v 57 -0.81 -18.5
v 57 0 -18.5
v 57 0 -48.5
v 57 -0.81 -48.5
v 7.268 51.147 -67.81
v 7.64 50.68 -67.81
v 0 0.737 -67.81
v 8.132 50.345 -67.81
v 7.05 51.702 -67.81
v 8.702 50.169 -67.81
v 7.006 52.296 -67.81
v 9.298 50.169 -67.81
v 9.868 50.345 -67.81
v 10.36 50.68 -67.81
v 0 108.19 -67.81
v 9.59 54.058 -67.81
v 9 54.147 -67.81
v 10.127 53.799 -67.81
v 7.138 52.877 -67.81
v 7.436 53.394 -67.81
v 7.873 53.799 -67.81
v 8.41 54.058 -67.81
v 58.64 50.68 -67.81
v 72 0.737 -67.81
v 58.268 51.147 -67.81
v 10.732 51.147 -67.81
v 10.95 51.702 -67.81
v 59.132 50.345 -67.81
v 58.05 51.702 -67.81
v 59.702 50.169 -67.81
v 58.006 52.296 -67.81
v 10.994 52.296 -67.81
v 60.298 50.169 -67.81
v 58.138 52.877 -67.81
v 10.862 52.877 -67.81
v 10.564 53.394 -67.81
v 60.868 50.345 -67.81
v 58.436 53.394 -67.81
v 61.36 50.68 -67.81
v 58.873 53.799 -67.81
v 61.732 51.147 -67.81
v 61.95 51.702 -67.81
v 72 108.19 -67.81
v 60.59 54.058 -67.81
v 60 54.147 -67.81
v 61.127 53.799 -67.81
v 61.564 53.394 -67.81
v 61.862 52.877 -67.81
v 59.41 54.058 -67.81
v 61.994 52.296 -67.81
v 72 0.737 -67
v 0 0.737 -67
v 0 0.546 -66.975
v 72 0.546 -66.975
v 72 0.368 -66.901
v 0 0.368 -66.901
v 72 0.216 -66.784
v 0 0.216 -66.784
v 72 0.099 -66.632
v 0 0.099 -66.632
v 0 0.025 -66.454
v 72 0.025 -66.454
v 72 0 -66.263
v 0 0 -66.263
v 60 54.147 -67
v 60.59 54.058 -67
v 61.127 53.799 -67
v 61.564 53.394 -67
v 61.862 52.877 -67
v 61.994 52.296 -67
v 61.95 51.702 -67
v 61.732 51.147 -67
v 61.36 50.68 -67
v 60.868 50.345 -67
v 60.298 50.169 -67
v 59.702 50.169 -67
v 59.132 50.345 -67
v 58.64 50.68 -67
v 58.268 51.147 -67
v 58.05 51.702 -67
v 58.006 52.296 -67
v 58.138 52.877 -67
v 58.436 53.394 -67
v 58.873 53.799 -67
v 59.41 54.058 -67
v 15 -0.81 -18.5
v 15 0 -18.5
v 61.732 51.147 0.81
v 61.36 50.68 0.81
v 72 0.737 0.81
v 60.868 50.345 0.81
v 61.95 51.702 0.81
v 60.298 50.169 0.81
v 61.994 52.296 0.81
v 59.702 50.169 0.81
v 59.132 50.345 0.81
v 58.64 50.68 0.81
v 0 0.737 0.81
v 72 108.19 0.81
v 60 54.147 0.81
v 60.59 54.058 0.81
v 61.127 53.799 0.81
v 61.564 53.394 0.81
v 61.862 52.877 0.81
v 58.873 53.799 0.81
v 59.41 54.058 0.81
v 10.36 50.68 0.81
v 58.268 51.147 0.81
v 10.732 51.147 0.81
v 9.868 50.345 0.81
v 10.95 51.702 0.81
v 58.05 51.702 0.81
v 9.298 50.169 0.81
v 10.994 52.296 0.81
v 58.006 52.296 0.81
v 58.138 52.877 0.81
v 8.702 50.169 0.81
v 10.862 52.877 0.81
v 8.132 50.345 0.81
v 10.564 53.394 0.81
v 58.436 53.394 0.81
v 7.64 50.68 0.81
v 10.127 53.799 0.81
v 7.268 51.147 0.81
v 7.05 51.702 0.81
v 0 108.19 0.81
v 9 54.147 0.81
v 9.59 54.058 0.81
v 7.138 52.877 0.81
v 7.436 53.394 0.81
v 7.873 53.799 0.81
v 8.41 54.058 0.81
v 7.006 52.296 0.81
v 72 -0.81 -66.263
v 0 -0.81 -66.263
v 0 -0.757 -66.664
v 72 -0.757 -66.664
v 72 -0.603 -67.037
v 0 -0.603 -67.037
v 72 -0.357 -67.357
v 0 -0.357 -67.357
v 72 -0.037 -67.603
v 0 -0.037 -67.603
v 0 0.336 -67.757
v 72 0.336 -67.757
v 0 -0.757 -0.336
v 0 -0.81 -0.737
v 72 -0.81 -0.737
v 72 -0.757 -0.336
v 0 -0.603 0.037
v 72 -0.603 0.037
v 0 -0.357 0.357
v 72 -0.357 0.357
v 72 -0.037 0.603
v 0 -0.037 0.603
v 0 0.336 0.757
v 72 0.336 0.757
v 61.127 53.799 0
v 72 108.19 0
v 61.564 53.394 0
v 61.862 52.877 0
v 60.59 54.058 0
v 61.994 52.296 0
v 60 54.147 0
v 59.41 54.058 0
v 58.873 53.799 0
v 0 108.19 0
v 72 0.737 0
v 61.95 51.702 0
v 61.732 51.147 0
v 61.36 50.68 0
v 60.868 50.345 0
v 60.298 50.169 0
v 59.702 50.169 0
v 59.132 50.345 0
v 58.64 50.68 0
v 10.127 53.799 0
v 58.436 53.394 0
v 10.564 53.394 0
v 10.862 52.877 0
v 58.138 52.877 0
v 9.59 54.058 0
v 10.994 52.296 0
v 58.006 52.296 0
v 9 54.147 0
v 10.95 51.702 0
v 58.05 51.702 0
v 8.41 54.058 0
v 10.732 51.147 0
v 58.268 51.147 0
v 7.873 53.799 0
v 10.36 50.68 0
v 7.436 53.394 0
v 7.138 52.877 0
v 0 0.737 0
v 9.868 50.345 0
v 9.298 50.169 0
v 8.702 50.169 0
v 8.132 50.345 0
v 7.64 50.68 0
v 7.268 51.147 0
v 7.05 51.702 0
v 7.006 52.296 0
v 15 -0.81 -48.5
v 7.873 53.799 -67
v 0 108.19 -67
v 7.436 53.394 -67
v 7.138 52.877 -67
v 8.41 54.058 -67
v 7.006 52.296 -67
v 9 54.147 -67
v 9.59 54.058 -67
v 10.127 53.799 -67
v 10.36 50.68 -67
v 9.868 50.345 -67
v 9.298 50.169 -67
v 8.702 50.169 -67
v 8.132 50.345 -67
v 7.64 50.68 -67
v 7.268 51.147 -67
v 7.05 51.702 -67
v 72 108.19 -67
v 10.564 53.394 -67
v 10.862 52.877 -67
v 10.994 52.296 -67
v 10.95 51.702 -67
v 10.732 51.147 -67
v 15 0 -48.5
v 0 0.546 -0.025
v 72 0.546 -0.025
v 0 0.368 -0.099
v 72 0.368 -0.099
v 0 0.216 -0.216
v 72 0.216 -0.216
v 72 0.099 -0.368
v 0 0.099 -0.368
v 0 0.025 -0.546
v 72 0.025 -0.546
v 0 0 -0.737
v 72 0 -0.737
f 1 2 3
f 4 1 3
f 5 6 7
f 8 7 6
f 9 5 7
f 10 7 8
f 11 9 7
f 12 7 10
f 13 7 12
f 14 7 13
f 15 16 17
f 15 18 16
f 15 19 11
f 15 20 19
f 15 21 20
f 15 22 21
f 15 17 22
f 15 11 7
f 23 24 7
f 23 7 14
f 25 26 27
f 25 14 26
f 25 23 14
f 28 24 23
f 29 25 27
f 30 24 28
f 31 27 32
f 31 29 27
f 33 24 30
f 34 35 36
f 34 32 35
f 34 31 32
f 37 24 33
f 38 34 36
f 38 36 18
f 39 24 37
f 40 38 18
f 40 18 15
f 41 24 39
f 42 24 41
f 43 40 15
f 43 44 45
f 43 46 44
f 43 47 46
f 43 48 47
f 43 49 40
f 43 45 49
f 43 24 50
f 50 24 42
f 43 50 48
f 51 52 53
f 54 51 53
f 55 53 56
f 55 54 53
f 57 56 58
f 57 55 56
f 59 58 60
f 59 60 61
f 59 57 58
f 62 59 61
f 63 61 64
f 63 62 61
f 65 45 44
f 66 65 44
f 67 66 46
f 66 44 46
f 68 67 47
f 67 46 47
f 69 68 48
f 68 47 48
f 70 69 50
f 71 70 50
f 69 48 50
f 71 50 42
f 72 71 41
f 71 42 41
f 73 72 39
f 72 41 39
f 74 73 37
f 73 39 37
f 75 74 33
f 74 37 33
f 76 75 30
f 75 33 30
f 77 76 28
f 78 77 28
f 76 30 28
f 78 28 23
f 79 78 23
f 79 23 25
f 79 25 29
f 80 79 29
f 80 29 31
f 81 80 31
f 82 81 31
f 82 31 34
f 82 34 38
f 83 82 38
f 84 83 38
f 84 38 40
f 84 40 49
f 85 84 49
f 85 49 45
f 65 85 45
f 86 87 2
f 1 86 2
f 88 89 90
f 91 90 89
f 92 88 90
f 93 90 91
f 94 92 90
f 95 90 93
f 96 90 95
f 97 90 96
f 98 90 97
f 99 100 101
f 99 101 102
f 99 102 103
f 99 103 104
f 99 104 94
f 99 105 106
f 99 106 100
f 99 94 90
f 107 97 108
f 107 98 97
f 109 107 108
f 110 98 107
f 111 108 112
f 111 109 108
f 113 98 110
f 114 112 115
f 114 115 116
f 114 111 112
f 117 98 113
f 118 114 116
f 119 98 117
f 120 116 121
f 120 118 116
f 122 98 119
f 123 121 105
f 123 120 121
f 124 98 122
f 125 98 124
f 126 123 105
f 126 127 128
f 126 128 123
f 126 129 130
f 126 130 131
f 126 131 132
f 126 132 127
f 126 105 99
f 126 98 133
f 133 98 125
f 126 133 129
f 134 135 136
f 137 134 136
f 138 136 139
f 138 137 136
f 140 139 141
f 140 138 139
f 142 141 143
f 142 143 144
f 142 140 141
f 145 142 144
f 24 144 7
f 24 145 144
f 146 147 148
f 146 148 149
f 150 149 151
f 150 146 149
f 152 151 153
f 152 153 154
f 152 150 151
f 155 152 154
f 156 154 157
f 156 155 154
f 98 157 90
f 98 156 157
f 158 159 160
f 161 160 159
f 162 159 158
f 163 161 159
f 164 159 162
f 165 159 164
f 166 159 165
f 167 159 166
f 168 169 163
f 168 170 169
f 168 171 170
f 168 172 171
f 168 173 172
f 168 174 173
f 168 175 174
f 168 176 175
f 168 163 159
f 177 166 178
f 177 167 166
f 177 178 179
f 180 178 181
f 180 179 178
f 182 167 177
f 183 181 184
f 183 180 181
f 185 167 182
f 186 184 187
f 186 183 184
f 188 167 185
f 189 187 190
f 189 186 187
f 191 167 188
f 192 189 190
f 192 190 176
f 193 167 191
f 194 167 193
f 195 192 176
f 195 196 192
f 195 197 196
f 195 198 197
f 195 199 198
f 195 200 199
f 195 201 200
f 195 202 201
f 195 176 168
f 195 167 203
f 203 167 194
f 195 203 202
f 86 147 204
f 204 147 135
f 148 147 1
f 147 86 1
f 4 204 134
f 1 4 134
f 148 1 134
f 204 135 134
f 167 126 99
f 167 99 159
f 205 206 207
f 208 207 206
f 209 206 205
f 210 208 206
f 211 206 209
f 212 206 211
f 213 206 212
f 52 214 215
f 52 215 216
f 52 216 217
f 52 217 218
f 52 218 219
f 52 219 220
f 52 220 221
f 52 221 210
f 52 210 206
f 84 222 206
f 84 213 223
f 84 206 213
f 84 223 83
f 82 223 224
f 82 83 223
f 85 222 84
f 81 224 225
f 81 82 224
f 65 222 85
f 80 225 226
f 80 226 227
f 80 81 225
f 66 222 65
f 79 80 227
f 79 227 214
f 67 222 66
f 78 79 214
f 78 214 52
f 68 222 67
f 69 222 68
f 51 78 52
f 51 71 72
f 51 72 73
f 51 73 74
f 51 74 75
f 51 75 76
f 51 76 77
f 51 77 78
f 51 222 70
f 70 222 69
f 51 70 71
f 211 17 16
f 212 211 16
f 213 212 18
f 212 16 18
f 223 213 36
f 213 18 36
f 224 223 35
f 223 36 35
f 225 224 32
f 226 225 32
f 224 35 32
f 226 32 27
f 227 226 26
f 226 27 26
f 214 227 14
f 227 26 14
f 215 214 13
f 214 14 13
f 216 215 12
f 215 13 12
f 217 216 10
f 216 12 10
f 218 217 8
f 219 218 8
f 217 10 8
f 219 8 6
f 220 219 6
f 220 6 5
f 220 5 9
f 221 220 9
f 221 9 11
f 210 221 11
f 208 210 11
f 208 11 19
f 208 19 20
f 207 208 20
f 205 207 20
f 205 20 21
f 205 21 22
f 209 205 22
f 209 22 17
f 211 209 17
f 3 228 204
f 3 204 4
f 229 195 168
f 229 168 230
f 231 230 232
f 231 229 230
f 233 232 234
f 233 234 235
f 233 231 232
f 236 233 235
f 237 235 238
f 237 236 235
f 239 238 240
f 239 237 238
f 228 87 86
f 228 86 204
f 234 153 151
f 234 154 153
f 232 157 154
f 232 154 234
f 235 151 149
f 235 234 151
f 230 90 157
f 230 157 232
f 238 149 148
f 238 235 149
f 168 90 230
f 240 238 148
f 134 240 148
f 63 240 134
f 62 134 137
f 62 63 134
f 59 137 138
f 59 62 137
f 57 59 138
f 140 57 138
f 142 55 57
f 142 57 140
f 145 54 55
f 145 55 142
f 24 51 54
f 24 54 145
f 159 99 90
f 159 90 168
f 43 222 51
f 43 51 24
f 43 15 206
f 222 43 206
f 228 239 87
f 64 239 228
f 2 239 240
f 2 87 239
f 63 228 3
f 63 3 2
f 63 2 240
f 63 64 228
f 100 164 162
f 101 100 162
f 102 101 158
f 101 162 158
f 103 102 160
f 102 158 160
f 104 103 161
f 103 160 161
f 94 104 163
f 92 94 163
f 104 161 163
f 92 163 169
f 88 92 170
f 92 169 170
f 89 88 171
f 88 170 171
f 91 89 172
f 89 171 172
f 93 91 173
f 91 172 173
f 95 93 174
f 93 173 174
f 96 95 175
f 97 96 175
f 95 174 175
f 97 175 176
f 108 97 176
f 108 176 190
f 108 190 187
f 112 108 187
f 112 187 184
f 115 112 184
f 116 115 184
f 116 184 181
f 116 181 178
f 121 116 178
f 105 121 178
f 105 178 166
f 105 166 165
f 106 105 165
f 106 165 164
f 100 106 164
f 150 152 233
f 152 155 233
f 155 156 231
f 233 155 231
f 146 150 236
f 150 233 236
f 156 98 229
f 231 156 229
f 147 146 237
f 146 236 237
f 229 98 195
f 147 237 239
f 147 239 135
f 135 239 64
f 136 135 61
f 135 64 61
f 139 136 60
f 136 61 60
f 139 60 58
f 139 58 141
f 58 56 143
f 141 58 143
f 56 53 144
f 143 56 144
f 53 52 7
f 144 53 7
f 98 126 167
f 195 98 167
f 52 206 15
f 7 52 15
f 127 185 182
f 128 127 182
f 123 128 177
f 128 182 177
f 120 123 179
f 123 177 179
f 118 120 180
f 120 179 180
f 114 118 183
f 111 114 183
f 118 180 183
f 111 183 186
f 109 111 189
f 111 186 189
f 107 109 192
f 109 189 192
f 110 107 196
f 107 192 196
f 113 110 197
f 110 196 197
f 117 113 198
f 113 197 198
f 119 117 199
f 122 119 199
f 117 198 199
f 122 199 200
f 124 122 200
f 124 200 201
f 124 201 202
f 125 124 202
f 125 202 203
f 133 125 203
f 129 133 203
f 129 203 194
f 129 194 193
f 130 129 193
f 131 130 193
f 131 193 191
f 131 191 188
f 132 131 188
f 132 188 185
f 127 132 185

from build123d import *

# Parameters (mm, degrees)
SKETCH1_W                      = 72
SKETCH1_H                      = 67
BASE_FLANGE1_DEPTH             = 0.81
EDGE_FLANGE1_STRIP_W           = 4.7132
EDGE_FLANGE1_STRIP_H           = 0.81
EDGE_FLANGE1_STRIP_CUT_DEPTH   = 72
EDGE_FLANGE1_STRIP_2_W         = 4.7132
EDGE_FLANGE1_STRIP_2_H         = 0.81
EDGE_FLANGE1_STRIP_CUT_2_DEPTH = 72
EDGE_FLANGE1_DEPTH             = 72
EDGE_FLANGE1_BEND_DEPTH        = 72
CUT_EXTRUDE1_REACH             = 148.585
SKETCH12_W                     = 42
SKETCH12_H                     = 30
CUT_EXTRUDE2_REACH             = 148.962
SKETCH13_R                     = 2


# Sheet-metal steps are written as plain solids
with BuildPart() as part:
    # Sketch1 → Base-Flange1 (new body)
    with BuildSketch(Plane(origin=(0, 0, 0), x_dir=(1, 0, 0), z_dir=(0, 1, 0))):
        with Locations((36, 33.5)):
            Rectangle(SKETCH1_W, SKETCH1_H)
    extrude(amount=-BASE_FLANGE1_DEPTH)

    # Edge-Flange1 strip (across the edge) → Edge-Flange1 strip cut (cut)
    with BuildSketch(Plane(origin=(0, 0, 0), x_dir=(0, 0, -1), z_dir=(1, 0, 0))):
        with Locations((-1.62, -0.405)):
            Rectangle(EDGE_FLANGE1_STRIP_W, EDGE_FLANGE1_STRIP_H)
    extrude(amount=EDGE_FLANGE1_STRIP_CUT_DEPTH, mode=Mode.SUBTRACT)

    # Edge-Flange1 strip 2 (across the edge) → Edge-Flange1 strip cut 2 (cut)
    with BuildSketch(Plane(origin=(72, 0, -67), x_dir=(0, 0, 1), z_dir=(-1, 0, 0))):
        with Locations((-1.62, -0.405)):
            Rectangle(EDGE_FLANGE1_STRIP_2_W, EDGE_FLANGE1_STRIP_2_H)
    extrude(amount=EDGE_FLANGE1_STRIP_CUT_2_DEPTH, mode=Mode.SUBTRACT)

    # Edge-Flange1 section (across the edge) → Edge-Flange1 (add)
    with BuildSketch(Plane(origin=(0, 0, 0), x_dir=(0, 0, -1), z_dir=(1, 0, 0))):
        with BuildLine():
            Line((-0.81, 0.7366), (-0.81, 108.19))
            Line((-0.81, 108.19), (0, 108.19))
            Line((0, 108.19), (0, 0.7366))
            ThreePointArc((0, 0.7366), (0.215745145, 0.215745145), (0.7366, 0))
            Line((0.7366, 0), (0.7366, -0.81))
            ThreePointArc((0.7366, -0.81), (-0.357011348, -0.357011348), (-0.81, 0.7366))
        make_face()
    extrude(amount=EDGE_FLANGE1_DEPTH)

    # Edge-Flange1 section 2 (across the edge) → Edge-Flange1 bend (add)
    with BuildSketch(Plane(origin=(72, 0, -67), x_dir=(0, 0, 1), z_dir=(-1, 0, 0))):
        with BuildLine():
            Line((-0.81, 0.7366), (-0.81, 108.19))
            Line((-0.81, 108.19), (0, 108.19))
            Line((0, 108.19), (0, 0.7366))
            ThreePointArc((0, 0.7366), (0.215745145, 0.215745145), (0.7366, 0))
            Line((0.7366, 0), (0.7366, -0.81))
            ThreePointArc((0.7366, -0.81), (-0.357011348, -0.357011348), (-0.81, 0.7366))
        make_face()
    extrude(amount=EDGE_FLANGE1_BEND_DEPTH)

    # Sketch12 → Cut-Extrude1 (cut, up to next)
    with BuildSketch(Plane(origin=(0, 0, 0), x_dir=(1, 0, 0), z_dir=(0, 1, 0)), mode=Mode.PRIVATE) as cut_extrude1_sk1:
        with Locations((36, 33.5)):
            Rectangle(SKETCH12_W, SKETCH12_H)
    cut_extrude1_tool1 = extrude(cut_extrude1_sk1.sketch, amount=-CUT_EXTRUDE1_REACH, mode=Mode.PRIVATE) & part.part
    add(cut_extrude1_tool1.solids().sort_by_distance((36, 0, -33.5))[0], mode=Mode.SUBTRACT)

    # Cut-Extrude2: up to this face of the body (flat: up to its plane)
    cut_extrude2_end = Plane(part.part.faces().sort_by_distance((36, 54.4633, 0.81))[0])
    # Sketch13 → Cut-Extrude2 (cut, up to the picked face)
    with BuildSketch(Plane(origin=(0, 0, -67.81), x_dir=(-1, 0, 0), z_dir=(0, 0, -1)), mode=Mode.PRIVATE) as cut_extrude2_sk1:
        with Locations(Location((-9, 52.1466, 0), (0, 0, 90))):
            Circle(SKETCH13_R)
    cut_extrude2_tool1 = split(extrude(cut_extrude2_sk1.sketch, amount=-CUT_EXTRUDE2_REACH, mode=Mode.PRIVATE), bisect_by=cut_extrude2_end, keep=Keep.BOTH, mode=Mode.PRIVATE)
    # Sketch13 → Cut-Extrude2 (cut, up to the picked face)
    with BuildSketch(Plane(origin=(0, 0, -67.81), x_dir=(-1, 0, 0), z_dir=(0, 0, -1)), mode=Mode.PRIVATE) as cut_extrude2_sk2:
        with Locations(Location((-60, 52.1466, 0), (0, 0, 90))):
            Circle(SKETCH13_R)
    cut_extrude2_tool2 = split(extrude(cut_extrude2_sk2.sketch, amount=-CUT_EXTRUDE2_REACH, mode=Mode.PRIVATE), bisect_by=cut_extrude2_end, keep=Keep.BOTH, mode=Mode.PRIVATE)
    add(cut_extrude2_tool1.solids().sort_by(Axis((9, 52.1466, -67.81), (0, 0, 1)))[0], mode=Mode.SUBTRACT)
    add(cut_extrude2_tool2.solids().sort_by(Axis((60, 52.1466, -67.81), (0, 0, 1)))[0], mode=Mode.SUBTRACT)


solid = part.part
